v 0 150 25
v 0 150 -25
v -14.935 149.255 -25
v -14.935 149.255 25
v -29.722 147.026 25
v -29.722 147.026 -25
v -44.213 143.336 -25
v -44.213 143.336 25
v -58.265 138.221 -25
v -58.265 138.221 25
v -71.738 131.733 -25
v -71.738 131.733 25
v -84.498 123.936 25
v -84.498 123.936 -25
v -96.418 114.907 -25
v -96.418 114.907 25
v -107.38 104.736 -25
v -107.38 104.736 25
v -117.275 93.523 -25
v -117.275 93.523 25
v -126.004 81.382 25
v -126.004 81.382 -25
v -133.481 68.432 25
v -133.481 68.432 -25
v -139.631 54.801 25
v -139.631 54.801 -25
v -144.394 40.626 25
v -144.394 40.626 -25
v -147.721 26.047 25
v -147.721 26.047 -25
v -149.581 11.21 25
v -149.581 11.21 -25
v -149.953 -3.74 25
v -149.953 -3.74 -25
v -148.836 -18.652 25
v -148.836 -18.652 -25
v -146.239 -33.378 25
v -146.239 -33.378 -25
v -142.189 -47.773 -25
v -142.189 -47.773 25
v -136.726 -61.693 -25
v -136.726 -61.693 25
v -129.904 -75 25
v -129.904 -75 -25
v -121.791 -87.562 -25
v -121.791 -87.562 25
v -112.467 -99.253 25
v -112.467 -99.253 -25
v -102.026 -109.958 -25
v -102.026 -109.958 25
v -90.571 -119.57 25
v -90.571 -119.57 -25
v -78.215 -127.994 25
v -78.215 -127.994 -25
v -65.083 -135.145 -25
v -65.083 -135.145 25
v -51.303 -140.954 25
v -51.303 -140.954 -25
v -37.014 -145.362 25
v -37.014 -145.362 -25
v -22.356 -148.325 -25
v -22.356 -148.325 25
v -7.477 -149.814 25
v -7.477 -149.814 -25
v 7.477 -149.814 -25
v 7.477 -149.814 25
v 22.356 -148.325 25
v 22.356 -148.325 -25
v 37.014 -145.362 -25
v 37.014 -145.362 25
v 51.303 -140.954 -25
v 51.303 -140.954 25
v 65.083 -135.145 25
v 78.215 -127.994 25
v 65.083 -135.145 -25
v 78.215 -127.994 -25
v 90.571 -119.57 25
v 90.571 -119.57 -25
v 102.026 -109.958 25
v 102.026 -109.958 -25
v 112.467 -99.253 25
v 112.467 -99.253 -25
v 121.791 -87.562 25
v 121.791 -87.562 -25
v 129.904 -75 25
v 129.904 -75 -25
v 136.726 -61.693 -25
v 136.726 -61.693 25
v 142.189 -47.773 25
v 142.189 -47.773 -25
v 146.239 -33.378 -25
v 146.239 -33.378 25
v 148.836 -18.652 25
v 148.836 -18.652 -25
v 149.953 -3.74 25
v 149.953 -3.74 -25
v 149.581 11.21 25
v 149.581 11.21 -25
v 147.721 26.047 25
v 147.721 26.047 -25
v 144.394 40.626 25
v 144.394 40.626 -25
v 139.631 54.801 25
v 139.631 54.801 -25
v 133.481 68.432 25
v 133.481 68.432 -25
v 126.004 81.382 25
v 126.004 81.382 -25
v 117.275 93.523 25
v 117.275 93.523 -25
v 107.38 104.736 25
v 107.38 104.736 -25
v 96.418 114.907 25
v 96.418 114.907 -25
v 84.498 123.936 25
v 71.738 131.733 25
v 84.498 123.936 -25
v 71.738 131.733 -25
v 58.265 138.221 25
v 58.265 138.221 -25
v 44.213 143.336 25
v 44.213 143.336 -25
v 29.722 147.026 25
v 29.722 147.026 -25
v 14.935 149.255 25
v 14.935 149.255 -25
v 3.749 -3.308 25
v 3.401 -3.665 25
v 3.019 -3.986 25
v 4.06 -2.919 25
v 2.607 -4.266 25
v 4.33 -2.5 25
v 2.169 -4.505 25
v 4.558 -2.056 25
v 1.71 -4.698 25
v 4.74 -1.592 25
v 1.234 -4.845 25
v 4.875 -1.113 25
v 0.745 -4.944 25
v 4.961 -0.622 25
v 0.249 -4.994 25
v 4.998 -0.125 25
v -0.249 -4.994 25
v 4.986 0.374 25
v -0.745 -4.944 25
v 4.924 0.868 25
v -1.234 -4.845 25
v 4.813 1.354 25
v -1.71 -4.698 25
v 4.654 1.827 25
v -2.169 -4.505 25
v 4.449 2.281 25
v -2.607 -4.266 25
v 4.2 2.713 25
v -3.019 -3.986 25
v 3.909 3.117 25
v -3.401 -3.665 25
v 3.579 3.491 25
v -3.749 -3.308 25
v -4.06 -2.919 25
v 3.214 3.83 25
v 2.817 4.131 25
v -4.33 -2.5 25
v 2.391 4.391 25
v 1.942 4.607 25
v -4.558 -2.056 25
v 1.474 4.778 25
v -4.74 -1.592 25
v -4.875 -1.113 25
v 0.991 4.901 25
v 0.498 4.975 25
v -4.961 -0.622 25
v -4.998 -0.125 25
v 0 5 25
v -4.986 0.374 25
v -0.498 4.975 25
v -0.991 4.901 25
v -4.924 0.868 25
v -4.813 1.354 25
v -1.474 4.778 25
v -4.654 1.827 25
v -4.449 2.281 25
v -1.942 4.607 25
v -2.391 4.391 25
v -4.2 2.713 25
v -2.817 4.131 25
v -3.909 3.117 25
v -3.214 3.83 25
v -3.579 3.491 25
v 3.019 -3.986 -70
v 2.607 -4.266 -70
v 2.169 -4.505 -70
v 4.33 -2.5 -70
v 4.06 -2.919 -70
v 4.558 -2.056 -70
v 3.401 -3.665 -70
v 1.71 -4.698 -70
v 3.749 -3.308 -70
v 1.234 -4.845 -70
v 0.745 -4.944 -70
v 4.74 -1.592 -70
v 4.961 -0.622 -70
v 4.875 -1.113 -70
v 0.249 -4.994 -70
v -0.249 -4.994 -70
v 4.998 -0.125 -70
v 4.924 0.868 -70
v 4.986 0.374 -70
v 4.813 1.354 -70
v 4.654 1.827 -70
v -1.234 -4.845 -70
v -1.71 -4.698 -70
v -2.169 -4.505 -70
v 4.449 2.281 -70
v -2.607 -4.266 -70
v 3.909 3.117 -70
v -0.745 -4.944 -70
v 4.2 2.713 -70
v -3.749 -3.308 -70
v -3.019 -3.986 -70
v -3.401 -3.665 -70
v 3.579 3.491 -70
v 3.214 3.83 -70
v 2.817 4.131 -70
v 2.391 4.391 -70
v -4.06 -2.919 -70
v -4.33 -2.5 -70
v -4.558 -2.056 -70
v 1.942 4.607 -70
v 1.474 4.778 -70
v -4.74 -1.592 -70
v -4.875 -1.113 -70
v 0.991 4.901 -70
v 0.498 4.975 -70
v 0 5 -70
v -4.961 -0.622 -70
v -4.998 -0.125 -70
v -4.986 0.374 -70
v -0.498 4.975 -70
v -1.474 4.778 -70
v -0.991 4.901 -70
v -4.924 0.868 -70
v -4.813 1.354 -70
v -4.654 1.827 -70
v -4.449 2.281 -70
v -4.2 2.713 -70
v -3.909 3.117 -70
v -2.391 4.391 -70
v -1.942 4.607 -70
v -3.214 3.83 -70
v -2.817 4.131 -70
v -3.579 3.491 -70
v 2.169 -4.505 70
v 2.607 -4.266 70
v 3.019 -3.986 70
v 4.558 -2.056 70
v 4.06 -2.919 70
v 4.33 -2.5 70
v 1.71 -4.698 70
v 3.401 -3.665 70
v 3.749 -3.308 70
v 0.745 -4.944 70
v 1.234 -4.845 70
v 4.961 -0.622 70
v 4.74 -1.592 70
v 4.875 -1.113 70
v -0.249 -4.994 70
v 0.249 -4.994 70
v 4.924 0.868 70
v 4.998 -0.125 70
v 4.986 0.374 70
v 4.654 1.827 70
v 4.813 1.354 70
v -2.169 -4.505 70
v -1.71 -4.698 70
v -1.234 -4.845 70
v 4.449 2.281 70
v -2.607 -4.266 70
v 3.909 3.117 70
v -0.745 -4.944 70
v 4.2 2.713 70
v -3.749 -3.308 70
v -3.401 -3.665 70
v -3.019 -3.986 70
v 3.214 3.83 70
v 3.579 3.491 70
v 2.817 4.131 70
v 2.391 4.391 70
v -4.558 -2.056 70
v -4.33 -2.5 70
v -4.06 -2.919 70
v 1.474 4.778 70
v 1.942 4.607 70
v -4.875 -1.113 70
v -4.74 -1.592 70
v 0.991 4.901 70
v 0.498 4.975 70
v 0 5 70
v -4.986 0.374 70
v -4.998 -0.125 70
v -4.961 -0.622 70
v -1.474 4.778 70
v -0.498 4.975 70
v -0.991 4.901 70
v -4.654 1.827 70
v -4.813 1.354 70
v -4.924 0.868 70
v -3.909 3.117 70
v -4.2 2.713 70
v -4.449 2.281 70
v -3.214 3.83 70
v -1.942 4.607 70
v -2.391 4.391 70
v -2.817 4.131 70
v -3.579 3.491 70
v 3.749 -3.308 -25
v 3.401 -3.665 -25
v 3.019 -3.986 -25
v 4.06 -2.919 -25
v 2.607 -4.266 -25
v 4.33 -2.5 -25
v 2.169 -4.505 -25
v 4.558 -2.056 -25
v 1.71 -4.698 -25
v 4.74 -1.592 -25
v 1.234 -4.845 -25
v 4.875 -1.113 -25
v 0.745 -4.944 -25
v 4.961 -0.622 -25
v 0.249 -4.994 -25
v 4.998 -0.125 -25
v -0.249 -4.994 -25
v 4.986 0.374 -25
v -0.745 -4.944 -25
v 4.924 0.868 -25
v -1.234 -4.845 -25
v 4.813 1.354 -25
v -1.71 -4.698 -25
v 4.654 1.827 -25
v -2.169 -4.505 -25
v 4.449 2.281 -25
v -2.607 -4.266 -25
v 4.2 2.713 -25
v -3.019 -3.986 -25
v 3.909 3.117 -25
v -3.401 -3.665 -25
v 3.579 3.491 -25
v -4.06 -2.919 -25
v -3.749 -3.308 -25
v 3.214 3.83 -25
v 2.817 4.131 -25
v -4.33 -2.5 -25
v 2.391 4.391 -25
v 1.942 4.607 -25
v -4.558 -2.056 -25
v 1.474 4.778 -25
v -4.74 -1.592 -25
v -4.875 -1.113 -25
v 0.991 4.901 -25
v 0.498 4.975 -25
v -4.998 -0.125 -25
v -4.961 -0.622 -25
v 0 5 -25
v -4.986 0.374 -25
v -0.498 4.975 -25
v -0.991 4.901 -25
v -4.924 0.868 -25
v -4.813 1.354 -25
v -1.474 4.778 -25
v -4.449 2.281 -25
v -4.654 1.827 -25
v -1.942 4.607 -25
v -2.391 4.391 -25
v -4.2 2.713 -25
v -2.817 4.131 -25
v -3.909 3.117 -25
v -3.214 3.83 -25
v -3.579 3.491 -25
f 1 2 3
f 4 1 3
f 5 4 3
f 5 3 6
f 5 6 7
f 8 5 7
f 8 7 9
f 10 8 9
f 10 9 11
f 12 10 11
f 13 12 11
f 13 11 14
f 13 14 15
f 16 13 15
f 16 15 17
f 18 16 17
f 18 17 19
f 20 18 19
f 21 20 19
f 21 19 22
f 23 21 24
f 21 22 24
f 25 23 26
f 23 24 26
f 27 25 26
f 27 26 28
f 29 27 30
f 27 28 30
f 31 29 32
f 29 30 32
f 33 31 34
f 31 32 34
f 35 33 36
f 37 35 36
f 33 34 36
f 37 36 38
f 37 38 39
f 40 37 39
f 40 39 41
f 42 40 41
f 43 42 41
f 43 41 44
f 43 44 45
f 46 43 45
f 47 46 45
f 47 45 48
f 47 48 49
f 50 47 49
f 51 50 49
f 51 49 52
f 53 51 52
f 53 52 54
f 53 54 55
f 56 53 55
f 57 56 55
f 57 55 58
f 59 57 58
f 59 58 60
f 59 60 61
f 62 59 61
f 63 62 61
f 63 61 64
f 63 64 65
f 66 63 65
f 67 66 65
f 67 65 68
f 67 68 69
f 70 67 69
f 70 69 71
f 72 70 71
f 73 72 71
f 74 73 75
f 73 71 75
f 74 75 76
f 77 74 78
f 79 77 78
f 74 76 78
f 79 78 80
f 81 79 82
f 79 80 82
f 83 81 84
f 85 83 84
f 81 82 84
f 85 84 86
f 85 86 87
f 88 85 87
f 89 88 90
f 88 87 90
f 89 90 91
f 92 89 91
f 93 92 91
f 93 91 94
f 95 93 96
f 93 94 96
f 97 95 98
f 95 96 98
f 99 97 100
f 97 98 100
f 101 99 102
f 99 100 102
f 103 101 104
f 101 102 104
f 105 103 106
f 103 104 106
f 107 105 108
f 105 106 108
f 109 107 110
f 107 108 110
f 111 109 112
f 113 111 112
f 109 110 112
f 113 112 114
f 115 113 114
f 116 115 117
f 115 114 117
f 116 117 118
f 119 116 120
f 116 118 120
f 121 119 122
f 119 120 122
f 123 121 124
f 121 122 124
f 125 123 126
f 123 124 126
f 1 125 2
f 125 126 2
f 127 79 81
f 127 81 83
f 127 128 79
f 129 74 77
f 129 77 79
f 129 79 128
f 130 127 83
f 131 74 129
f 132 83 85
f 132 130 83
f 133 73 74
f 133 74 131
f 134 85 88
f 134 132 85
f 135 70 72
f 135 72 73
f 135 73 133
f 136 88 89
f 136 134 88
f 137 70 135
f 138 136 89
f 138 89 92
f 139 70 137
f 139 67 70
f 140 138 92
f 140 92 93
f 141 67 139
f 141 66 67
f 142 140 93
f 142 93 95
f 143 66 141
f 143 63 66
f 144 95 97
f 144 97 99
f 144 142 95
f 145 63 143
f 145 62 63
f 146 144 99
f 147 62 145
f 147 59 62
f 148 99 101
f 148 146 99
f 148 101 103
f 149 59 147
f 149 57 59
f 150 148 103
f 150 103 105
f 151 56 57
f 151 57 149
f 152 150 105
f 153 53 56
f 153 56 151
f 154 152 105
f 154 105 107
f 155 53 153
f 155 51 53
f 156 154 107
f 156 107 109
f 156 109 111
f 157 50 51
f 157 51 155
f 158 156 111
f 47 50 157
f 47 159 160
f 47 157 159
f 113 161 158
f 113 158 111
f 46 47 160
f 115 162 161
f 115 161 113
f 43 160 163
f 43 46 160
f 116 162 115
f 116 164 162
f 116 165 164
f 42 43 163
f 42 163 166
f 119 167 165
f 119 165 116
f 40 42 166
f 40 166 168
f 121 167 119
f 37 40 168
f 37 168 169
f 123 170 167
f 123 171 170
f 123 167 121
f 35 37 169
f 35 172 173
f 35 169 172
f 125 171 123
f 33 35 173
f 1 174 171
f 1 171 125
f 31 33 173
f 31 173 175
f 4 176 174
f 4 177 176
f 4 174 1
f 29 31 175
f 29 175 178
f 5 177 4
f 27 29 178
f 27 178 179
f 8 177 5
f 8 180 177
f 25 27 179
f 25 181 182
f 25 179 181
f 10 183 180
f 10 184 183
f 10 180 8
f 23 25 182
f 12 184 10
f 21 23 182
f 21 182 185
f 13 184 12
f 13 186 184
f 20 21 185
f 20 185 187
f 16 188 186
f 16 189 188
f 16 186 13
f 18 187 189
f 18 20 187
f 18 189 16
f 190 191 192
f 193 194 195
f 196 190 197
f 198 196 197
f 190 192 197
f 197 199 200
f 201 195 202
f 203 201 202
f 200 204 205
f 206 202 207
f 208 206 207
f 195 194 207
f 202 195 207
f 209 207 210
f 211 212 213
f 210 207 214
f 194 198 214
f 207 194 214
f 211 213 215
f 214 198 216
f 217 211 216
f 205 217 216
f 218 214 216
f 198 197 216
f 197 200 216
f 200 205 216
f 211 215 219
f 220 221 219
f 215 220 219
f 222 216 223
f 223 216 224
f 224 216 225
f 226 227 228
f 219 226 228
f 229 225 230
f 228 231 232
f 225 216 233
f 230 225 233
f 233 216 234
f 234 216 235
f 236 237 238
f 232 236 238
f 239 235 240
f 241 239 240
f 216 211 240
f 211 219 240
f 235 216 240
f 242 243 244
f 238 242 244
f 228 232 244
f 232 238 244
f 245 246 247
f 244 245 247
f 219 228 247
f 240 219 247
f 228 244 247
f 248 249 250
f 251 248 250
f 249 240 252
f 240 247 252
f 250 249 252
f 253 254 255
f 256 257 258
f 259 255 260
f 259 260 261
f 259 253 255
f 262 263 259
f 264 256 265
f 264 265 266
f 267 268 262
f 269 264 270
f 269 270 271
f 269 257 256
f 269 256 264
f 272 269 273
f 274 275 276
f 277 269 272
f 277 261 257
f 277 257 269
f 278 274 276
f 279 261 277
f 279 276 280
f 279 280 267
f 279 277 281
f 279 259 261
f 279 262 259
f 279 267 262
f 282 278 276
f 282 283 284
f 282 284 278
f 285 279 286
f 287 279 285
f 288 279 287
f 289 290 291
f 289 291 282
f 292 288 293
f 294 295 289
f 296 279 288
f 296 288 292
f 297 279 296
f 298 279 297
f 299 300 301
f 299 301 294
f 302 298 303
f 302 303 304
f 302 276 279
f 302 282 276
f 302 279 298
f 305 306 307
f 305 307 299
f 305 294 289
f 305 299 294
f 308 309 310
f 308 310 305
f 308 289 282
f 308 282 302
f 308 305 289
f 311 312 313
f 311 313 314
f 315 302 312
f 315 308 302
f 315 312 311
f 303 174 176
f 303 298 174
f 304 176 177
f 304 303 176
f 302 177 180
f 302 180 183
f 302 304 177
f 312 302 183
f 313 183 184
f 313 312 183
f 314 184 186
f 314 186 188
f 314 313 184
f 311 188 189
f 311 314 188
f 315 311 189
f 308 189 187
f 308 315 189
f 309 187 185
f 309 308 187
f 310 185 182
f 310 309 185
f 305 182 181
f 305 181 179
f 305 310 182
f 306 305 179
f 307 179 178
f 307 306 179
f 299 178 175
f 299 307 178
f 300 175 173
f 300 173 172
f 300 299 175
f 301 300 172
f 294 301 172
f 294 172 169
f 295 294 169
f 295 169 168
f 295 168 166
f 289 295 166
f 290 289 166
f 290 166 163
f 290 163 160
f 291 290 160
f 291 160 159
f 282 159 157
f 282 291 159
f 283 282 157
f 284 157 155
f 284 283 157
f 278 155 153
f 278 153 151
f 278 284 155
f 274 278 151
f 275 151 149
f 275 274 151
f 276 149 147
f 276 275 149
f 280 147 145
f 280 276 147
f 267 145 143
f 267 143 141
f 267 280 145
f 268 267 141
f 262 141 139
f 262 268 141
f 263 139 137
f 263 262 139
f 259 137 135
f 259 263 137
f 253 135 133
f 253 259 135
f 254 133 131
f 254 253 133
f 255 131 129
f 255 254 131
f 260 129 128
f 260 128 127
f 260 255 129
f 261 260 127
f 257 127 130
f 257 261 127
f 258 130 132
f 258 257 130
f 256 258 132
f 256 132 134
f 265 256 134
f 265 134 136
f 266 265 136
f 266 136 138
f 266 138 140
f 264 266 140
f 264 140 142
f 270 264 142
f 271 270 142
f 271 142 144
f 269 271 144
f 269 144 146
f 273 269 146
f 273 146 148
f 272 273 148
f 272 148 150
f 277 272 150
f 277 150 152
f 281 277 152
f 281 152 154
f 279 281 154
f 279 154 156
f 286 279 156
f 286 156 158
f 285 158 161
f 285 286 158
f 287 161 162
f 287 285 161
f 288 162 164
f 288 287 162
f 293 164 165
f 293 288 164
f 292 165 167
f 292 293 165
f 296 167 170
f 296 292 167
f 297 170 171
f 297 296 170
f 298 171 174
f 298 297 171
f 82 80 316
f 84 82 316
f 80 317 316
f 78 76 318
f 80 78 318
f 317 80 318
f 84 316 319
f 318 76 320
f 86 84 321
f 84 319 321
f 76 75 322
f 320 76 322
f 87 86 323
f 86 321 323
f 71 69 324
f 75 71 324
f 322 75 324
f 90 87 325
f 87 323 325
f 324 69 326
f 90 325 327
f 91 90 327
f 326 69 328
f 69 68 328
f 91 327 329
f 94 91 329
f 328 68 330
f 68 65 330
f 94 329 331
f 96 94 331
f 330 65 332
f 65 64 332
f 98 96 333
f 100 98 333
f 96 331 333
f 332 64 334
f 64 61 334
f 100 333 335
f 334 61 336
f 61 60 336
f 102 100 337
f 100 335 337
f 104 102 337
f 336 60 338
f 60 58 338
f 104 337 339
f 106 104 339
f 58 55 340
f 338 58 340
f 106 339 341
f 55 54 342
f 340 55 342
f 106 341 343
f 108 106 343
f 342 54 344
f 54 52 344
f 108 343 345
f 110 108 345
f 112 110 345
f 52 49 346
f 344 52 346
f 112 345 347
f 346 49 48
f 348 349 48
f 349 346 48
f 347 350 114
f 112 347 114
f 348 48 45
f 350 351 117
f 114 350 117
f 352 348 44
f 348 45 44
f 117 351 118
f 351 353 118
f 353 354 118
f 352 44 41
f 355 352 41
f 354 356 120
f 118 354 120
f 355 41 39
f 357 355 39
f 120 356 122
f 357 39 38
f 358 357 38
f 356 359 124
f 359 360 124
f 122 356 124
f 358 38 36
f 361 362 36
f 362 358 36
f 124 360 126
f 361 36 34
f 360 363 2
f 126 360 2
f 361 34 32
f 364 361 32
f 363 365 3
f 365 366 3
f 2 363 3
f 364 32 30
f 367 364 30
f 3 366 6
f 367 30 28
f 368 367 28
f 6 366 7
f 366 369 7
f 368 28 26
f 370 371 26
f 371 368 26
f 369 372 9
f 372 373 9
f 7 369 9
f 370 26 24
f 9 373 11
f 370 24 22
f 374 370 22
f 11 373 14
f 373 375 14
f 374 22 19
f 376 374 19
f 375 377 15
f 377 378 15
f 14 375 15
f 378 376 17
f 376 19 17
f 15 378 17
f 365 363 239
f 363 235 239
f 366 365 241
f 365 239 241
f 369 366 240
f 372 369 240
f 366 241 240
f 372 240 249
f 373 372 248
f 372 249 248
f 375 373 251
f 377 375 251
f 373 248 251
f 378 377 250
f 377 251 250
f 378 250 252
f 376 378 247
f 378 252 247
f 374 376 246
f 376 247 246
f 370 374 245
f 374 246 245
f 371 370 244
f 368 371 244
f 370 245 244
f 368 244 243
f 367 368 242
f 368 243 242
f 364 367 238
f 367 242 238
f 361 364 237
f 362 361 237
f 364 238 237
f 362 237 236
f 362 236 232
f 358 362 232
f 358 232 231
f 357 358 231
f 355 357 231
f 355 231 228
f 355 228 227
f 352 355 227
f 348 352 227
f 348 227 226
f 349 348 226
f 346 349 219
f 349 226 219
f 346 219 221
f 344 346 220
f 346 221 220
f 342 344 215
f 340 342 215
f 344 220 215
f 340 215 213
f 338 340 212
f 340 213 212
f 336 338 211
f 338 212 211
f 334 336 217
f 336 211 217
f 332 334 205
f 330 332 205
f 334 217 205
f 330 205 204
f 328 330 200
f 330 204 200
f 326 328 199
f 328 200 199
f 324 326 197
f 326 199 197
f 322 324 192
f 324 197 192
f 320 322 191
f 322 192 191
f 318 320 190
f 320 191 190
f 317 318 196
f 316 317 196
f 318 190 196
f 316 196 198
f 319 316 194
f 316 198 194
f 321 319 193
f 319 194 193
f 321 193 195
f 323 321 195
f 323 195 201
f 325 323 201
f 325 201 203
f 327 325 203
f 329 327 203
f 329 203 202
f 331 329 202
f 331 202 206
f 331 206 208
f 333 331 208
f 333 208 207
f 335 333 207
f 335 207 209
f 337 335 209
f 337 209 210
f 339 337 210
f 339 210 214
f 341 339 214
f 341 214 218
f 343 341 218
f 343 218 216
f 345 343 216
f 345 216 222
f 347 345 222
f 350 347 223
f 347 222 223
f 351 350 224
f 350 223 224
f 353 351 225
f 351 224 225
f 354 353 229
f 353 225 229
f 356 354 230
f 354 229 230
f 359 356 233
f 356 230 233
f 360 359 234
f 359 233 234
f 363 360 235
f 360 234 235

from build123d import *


with BuildPart() as part:
    # Sketch → Revolution (revolve)
    with BuildSketch(Plane.YZ):
        Polygon((150, 0), (150, 25), (5, 25), (5, 70), (0, 70), (0, 0), align=None)
    revolution = revolve(axis=Axis((0, 0, 0), (0, 0, 1)))

    # Mirrored: Revolution across Sketch H_Axis
    add(revolution.mirror(Plane.XY))


solid = part.part
